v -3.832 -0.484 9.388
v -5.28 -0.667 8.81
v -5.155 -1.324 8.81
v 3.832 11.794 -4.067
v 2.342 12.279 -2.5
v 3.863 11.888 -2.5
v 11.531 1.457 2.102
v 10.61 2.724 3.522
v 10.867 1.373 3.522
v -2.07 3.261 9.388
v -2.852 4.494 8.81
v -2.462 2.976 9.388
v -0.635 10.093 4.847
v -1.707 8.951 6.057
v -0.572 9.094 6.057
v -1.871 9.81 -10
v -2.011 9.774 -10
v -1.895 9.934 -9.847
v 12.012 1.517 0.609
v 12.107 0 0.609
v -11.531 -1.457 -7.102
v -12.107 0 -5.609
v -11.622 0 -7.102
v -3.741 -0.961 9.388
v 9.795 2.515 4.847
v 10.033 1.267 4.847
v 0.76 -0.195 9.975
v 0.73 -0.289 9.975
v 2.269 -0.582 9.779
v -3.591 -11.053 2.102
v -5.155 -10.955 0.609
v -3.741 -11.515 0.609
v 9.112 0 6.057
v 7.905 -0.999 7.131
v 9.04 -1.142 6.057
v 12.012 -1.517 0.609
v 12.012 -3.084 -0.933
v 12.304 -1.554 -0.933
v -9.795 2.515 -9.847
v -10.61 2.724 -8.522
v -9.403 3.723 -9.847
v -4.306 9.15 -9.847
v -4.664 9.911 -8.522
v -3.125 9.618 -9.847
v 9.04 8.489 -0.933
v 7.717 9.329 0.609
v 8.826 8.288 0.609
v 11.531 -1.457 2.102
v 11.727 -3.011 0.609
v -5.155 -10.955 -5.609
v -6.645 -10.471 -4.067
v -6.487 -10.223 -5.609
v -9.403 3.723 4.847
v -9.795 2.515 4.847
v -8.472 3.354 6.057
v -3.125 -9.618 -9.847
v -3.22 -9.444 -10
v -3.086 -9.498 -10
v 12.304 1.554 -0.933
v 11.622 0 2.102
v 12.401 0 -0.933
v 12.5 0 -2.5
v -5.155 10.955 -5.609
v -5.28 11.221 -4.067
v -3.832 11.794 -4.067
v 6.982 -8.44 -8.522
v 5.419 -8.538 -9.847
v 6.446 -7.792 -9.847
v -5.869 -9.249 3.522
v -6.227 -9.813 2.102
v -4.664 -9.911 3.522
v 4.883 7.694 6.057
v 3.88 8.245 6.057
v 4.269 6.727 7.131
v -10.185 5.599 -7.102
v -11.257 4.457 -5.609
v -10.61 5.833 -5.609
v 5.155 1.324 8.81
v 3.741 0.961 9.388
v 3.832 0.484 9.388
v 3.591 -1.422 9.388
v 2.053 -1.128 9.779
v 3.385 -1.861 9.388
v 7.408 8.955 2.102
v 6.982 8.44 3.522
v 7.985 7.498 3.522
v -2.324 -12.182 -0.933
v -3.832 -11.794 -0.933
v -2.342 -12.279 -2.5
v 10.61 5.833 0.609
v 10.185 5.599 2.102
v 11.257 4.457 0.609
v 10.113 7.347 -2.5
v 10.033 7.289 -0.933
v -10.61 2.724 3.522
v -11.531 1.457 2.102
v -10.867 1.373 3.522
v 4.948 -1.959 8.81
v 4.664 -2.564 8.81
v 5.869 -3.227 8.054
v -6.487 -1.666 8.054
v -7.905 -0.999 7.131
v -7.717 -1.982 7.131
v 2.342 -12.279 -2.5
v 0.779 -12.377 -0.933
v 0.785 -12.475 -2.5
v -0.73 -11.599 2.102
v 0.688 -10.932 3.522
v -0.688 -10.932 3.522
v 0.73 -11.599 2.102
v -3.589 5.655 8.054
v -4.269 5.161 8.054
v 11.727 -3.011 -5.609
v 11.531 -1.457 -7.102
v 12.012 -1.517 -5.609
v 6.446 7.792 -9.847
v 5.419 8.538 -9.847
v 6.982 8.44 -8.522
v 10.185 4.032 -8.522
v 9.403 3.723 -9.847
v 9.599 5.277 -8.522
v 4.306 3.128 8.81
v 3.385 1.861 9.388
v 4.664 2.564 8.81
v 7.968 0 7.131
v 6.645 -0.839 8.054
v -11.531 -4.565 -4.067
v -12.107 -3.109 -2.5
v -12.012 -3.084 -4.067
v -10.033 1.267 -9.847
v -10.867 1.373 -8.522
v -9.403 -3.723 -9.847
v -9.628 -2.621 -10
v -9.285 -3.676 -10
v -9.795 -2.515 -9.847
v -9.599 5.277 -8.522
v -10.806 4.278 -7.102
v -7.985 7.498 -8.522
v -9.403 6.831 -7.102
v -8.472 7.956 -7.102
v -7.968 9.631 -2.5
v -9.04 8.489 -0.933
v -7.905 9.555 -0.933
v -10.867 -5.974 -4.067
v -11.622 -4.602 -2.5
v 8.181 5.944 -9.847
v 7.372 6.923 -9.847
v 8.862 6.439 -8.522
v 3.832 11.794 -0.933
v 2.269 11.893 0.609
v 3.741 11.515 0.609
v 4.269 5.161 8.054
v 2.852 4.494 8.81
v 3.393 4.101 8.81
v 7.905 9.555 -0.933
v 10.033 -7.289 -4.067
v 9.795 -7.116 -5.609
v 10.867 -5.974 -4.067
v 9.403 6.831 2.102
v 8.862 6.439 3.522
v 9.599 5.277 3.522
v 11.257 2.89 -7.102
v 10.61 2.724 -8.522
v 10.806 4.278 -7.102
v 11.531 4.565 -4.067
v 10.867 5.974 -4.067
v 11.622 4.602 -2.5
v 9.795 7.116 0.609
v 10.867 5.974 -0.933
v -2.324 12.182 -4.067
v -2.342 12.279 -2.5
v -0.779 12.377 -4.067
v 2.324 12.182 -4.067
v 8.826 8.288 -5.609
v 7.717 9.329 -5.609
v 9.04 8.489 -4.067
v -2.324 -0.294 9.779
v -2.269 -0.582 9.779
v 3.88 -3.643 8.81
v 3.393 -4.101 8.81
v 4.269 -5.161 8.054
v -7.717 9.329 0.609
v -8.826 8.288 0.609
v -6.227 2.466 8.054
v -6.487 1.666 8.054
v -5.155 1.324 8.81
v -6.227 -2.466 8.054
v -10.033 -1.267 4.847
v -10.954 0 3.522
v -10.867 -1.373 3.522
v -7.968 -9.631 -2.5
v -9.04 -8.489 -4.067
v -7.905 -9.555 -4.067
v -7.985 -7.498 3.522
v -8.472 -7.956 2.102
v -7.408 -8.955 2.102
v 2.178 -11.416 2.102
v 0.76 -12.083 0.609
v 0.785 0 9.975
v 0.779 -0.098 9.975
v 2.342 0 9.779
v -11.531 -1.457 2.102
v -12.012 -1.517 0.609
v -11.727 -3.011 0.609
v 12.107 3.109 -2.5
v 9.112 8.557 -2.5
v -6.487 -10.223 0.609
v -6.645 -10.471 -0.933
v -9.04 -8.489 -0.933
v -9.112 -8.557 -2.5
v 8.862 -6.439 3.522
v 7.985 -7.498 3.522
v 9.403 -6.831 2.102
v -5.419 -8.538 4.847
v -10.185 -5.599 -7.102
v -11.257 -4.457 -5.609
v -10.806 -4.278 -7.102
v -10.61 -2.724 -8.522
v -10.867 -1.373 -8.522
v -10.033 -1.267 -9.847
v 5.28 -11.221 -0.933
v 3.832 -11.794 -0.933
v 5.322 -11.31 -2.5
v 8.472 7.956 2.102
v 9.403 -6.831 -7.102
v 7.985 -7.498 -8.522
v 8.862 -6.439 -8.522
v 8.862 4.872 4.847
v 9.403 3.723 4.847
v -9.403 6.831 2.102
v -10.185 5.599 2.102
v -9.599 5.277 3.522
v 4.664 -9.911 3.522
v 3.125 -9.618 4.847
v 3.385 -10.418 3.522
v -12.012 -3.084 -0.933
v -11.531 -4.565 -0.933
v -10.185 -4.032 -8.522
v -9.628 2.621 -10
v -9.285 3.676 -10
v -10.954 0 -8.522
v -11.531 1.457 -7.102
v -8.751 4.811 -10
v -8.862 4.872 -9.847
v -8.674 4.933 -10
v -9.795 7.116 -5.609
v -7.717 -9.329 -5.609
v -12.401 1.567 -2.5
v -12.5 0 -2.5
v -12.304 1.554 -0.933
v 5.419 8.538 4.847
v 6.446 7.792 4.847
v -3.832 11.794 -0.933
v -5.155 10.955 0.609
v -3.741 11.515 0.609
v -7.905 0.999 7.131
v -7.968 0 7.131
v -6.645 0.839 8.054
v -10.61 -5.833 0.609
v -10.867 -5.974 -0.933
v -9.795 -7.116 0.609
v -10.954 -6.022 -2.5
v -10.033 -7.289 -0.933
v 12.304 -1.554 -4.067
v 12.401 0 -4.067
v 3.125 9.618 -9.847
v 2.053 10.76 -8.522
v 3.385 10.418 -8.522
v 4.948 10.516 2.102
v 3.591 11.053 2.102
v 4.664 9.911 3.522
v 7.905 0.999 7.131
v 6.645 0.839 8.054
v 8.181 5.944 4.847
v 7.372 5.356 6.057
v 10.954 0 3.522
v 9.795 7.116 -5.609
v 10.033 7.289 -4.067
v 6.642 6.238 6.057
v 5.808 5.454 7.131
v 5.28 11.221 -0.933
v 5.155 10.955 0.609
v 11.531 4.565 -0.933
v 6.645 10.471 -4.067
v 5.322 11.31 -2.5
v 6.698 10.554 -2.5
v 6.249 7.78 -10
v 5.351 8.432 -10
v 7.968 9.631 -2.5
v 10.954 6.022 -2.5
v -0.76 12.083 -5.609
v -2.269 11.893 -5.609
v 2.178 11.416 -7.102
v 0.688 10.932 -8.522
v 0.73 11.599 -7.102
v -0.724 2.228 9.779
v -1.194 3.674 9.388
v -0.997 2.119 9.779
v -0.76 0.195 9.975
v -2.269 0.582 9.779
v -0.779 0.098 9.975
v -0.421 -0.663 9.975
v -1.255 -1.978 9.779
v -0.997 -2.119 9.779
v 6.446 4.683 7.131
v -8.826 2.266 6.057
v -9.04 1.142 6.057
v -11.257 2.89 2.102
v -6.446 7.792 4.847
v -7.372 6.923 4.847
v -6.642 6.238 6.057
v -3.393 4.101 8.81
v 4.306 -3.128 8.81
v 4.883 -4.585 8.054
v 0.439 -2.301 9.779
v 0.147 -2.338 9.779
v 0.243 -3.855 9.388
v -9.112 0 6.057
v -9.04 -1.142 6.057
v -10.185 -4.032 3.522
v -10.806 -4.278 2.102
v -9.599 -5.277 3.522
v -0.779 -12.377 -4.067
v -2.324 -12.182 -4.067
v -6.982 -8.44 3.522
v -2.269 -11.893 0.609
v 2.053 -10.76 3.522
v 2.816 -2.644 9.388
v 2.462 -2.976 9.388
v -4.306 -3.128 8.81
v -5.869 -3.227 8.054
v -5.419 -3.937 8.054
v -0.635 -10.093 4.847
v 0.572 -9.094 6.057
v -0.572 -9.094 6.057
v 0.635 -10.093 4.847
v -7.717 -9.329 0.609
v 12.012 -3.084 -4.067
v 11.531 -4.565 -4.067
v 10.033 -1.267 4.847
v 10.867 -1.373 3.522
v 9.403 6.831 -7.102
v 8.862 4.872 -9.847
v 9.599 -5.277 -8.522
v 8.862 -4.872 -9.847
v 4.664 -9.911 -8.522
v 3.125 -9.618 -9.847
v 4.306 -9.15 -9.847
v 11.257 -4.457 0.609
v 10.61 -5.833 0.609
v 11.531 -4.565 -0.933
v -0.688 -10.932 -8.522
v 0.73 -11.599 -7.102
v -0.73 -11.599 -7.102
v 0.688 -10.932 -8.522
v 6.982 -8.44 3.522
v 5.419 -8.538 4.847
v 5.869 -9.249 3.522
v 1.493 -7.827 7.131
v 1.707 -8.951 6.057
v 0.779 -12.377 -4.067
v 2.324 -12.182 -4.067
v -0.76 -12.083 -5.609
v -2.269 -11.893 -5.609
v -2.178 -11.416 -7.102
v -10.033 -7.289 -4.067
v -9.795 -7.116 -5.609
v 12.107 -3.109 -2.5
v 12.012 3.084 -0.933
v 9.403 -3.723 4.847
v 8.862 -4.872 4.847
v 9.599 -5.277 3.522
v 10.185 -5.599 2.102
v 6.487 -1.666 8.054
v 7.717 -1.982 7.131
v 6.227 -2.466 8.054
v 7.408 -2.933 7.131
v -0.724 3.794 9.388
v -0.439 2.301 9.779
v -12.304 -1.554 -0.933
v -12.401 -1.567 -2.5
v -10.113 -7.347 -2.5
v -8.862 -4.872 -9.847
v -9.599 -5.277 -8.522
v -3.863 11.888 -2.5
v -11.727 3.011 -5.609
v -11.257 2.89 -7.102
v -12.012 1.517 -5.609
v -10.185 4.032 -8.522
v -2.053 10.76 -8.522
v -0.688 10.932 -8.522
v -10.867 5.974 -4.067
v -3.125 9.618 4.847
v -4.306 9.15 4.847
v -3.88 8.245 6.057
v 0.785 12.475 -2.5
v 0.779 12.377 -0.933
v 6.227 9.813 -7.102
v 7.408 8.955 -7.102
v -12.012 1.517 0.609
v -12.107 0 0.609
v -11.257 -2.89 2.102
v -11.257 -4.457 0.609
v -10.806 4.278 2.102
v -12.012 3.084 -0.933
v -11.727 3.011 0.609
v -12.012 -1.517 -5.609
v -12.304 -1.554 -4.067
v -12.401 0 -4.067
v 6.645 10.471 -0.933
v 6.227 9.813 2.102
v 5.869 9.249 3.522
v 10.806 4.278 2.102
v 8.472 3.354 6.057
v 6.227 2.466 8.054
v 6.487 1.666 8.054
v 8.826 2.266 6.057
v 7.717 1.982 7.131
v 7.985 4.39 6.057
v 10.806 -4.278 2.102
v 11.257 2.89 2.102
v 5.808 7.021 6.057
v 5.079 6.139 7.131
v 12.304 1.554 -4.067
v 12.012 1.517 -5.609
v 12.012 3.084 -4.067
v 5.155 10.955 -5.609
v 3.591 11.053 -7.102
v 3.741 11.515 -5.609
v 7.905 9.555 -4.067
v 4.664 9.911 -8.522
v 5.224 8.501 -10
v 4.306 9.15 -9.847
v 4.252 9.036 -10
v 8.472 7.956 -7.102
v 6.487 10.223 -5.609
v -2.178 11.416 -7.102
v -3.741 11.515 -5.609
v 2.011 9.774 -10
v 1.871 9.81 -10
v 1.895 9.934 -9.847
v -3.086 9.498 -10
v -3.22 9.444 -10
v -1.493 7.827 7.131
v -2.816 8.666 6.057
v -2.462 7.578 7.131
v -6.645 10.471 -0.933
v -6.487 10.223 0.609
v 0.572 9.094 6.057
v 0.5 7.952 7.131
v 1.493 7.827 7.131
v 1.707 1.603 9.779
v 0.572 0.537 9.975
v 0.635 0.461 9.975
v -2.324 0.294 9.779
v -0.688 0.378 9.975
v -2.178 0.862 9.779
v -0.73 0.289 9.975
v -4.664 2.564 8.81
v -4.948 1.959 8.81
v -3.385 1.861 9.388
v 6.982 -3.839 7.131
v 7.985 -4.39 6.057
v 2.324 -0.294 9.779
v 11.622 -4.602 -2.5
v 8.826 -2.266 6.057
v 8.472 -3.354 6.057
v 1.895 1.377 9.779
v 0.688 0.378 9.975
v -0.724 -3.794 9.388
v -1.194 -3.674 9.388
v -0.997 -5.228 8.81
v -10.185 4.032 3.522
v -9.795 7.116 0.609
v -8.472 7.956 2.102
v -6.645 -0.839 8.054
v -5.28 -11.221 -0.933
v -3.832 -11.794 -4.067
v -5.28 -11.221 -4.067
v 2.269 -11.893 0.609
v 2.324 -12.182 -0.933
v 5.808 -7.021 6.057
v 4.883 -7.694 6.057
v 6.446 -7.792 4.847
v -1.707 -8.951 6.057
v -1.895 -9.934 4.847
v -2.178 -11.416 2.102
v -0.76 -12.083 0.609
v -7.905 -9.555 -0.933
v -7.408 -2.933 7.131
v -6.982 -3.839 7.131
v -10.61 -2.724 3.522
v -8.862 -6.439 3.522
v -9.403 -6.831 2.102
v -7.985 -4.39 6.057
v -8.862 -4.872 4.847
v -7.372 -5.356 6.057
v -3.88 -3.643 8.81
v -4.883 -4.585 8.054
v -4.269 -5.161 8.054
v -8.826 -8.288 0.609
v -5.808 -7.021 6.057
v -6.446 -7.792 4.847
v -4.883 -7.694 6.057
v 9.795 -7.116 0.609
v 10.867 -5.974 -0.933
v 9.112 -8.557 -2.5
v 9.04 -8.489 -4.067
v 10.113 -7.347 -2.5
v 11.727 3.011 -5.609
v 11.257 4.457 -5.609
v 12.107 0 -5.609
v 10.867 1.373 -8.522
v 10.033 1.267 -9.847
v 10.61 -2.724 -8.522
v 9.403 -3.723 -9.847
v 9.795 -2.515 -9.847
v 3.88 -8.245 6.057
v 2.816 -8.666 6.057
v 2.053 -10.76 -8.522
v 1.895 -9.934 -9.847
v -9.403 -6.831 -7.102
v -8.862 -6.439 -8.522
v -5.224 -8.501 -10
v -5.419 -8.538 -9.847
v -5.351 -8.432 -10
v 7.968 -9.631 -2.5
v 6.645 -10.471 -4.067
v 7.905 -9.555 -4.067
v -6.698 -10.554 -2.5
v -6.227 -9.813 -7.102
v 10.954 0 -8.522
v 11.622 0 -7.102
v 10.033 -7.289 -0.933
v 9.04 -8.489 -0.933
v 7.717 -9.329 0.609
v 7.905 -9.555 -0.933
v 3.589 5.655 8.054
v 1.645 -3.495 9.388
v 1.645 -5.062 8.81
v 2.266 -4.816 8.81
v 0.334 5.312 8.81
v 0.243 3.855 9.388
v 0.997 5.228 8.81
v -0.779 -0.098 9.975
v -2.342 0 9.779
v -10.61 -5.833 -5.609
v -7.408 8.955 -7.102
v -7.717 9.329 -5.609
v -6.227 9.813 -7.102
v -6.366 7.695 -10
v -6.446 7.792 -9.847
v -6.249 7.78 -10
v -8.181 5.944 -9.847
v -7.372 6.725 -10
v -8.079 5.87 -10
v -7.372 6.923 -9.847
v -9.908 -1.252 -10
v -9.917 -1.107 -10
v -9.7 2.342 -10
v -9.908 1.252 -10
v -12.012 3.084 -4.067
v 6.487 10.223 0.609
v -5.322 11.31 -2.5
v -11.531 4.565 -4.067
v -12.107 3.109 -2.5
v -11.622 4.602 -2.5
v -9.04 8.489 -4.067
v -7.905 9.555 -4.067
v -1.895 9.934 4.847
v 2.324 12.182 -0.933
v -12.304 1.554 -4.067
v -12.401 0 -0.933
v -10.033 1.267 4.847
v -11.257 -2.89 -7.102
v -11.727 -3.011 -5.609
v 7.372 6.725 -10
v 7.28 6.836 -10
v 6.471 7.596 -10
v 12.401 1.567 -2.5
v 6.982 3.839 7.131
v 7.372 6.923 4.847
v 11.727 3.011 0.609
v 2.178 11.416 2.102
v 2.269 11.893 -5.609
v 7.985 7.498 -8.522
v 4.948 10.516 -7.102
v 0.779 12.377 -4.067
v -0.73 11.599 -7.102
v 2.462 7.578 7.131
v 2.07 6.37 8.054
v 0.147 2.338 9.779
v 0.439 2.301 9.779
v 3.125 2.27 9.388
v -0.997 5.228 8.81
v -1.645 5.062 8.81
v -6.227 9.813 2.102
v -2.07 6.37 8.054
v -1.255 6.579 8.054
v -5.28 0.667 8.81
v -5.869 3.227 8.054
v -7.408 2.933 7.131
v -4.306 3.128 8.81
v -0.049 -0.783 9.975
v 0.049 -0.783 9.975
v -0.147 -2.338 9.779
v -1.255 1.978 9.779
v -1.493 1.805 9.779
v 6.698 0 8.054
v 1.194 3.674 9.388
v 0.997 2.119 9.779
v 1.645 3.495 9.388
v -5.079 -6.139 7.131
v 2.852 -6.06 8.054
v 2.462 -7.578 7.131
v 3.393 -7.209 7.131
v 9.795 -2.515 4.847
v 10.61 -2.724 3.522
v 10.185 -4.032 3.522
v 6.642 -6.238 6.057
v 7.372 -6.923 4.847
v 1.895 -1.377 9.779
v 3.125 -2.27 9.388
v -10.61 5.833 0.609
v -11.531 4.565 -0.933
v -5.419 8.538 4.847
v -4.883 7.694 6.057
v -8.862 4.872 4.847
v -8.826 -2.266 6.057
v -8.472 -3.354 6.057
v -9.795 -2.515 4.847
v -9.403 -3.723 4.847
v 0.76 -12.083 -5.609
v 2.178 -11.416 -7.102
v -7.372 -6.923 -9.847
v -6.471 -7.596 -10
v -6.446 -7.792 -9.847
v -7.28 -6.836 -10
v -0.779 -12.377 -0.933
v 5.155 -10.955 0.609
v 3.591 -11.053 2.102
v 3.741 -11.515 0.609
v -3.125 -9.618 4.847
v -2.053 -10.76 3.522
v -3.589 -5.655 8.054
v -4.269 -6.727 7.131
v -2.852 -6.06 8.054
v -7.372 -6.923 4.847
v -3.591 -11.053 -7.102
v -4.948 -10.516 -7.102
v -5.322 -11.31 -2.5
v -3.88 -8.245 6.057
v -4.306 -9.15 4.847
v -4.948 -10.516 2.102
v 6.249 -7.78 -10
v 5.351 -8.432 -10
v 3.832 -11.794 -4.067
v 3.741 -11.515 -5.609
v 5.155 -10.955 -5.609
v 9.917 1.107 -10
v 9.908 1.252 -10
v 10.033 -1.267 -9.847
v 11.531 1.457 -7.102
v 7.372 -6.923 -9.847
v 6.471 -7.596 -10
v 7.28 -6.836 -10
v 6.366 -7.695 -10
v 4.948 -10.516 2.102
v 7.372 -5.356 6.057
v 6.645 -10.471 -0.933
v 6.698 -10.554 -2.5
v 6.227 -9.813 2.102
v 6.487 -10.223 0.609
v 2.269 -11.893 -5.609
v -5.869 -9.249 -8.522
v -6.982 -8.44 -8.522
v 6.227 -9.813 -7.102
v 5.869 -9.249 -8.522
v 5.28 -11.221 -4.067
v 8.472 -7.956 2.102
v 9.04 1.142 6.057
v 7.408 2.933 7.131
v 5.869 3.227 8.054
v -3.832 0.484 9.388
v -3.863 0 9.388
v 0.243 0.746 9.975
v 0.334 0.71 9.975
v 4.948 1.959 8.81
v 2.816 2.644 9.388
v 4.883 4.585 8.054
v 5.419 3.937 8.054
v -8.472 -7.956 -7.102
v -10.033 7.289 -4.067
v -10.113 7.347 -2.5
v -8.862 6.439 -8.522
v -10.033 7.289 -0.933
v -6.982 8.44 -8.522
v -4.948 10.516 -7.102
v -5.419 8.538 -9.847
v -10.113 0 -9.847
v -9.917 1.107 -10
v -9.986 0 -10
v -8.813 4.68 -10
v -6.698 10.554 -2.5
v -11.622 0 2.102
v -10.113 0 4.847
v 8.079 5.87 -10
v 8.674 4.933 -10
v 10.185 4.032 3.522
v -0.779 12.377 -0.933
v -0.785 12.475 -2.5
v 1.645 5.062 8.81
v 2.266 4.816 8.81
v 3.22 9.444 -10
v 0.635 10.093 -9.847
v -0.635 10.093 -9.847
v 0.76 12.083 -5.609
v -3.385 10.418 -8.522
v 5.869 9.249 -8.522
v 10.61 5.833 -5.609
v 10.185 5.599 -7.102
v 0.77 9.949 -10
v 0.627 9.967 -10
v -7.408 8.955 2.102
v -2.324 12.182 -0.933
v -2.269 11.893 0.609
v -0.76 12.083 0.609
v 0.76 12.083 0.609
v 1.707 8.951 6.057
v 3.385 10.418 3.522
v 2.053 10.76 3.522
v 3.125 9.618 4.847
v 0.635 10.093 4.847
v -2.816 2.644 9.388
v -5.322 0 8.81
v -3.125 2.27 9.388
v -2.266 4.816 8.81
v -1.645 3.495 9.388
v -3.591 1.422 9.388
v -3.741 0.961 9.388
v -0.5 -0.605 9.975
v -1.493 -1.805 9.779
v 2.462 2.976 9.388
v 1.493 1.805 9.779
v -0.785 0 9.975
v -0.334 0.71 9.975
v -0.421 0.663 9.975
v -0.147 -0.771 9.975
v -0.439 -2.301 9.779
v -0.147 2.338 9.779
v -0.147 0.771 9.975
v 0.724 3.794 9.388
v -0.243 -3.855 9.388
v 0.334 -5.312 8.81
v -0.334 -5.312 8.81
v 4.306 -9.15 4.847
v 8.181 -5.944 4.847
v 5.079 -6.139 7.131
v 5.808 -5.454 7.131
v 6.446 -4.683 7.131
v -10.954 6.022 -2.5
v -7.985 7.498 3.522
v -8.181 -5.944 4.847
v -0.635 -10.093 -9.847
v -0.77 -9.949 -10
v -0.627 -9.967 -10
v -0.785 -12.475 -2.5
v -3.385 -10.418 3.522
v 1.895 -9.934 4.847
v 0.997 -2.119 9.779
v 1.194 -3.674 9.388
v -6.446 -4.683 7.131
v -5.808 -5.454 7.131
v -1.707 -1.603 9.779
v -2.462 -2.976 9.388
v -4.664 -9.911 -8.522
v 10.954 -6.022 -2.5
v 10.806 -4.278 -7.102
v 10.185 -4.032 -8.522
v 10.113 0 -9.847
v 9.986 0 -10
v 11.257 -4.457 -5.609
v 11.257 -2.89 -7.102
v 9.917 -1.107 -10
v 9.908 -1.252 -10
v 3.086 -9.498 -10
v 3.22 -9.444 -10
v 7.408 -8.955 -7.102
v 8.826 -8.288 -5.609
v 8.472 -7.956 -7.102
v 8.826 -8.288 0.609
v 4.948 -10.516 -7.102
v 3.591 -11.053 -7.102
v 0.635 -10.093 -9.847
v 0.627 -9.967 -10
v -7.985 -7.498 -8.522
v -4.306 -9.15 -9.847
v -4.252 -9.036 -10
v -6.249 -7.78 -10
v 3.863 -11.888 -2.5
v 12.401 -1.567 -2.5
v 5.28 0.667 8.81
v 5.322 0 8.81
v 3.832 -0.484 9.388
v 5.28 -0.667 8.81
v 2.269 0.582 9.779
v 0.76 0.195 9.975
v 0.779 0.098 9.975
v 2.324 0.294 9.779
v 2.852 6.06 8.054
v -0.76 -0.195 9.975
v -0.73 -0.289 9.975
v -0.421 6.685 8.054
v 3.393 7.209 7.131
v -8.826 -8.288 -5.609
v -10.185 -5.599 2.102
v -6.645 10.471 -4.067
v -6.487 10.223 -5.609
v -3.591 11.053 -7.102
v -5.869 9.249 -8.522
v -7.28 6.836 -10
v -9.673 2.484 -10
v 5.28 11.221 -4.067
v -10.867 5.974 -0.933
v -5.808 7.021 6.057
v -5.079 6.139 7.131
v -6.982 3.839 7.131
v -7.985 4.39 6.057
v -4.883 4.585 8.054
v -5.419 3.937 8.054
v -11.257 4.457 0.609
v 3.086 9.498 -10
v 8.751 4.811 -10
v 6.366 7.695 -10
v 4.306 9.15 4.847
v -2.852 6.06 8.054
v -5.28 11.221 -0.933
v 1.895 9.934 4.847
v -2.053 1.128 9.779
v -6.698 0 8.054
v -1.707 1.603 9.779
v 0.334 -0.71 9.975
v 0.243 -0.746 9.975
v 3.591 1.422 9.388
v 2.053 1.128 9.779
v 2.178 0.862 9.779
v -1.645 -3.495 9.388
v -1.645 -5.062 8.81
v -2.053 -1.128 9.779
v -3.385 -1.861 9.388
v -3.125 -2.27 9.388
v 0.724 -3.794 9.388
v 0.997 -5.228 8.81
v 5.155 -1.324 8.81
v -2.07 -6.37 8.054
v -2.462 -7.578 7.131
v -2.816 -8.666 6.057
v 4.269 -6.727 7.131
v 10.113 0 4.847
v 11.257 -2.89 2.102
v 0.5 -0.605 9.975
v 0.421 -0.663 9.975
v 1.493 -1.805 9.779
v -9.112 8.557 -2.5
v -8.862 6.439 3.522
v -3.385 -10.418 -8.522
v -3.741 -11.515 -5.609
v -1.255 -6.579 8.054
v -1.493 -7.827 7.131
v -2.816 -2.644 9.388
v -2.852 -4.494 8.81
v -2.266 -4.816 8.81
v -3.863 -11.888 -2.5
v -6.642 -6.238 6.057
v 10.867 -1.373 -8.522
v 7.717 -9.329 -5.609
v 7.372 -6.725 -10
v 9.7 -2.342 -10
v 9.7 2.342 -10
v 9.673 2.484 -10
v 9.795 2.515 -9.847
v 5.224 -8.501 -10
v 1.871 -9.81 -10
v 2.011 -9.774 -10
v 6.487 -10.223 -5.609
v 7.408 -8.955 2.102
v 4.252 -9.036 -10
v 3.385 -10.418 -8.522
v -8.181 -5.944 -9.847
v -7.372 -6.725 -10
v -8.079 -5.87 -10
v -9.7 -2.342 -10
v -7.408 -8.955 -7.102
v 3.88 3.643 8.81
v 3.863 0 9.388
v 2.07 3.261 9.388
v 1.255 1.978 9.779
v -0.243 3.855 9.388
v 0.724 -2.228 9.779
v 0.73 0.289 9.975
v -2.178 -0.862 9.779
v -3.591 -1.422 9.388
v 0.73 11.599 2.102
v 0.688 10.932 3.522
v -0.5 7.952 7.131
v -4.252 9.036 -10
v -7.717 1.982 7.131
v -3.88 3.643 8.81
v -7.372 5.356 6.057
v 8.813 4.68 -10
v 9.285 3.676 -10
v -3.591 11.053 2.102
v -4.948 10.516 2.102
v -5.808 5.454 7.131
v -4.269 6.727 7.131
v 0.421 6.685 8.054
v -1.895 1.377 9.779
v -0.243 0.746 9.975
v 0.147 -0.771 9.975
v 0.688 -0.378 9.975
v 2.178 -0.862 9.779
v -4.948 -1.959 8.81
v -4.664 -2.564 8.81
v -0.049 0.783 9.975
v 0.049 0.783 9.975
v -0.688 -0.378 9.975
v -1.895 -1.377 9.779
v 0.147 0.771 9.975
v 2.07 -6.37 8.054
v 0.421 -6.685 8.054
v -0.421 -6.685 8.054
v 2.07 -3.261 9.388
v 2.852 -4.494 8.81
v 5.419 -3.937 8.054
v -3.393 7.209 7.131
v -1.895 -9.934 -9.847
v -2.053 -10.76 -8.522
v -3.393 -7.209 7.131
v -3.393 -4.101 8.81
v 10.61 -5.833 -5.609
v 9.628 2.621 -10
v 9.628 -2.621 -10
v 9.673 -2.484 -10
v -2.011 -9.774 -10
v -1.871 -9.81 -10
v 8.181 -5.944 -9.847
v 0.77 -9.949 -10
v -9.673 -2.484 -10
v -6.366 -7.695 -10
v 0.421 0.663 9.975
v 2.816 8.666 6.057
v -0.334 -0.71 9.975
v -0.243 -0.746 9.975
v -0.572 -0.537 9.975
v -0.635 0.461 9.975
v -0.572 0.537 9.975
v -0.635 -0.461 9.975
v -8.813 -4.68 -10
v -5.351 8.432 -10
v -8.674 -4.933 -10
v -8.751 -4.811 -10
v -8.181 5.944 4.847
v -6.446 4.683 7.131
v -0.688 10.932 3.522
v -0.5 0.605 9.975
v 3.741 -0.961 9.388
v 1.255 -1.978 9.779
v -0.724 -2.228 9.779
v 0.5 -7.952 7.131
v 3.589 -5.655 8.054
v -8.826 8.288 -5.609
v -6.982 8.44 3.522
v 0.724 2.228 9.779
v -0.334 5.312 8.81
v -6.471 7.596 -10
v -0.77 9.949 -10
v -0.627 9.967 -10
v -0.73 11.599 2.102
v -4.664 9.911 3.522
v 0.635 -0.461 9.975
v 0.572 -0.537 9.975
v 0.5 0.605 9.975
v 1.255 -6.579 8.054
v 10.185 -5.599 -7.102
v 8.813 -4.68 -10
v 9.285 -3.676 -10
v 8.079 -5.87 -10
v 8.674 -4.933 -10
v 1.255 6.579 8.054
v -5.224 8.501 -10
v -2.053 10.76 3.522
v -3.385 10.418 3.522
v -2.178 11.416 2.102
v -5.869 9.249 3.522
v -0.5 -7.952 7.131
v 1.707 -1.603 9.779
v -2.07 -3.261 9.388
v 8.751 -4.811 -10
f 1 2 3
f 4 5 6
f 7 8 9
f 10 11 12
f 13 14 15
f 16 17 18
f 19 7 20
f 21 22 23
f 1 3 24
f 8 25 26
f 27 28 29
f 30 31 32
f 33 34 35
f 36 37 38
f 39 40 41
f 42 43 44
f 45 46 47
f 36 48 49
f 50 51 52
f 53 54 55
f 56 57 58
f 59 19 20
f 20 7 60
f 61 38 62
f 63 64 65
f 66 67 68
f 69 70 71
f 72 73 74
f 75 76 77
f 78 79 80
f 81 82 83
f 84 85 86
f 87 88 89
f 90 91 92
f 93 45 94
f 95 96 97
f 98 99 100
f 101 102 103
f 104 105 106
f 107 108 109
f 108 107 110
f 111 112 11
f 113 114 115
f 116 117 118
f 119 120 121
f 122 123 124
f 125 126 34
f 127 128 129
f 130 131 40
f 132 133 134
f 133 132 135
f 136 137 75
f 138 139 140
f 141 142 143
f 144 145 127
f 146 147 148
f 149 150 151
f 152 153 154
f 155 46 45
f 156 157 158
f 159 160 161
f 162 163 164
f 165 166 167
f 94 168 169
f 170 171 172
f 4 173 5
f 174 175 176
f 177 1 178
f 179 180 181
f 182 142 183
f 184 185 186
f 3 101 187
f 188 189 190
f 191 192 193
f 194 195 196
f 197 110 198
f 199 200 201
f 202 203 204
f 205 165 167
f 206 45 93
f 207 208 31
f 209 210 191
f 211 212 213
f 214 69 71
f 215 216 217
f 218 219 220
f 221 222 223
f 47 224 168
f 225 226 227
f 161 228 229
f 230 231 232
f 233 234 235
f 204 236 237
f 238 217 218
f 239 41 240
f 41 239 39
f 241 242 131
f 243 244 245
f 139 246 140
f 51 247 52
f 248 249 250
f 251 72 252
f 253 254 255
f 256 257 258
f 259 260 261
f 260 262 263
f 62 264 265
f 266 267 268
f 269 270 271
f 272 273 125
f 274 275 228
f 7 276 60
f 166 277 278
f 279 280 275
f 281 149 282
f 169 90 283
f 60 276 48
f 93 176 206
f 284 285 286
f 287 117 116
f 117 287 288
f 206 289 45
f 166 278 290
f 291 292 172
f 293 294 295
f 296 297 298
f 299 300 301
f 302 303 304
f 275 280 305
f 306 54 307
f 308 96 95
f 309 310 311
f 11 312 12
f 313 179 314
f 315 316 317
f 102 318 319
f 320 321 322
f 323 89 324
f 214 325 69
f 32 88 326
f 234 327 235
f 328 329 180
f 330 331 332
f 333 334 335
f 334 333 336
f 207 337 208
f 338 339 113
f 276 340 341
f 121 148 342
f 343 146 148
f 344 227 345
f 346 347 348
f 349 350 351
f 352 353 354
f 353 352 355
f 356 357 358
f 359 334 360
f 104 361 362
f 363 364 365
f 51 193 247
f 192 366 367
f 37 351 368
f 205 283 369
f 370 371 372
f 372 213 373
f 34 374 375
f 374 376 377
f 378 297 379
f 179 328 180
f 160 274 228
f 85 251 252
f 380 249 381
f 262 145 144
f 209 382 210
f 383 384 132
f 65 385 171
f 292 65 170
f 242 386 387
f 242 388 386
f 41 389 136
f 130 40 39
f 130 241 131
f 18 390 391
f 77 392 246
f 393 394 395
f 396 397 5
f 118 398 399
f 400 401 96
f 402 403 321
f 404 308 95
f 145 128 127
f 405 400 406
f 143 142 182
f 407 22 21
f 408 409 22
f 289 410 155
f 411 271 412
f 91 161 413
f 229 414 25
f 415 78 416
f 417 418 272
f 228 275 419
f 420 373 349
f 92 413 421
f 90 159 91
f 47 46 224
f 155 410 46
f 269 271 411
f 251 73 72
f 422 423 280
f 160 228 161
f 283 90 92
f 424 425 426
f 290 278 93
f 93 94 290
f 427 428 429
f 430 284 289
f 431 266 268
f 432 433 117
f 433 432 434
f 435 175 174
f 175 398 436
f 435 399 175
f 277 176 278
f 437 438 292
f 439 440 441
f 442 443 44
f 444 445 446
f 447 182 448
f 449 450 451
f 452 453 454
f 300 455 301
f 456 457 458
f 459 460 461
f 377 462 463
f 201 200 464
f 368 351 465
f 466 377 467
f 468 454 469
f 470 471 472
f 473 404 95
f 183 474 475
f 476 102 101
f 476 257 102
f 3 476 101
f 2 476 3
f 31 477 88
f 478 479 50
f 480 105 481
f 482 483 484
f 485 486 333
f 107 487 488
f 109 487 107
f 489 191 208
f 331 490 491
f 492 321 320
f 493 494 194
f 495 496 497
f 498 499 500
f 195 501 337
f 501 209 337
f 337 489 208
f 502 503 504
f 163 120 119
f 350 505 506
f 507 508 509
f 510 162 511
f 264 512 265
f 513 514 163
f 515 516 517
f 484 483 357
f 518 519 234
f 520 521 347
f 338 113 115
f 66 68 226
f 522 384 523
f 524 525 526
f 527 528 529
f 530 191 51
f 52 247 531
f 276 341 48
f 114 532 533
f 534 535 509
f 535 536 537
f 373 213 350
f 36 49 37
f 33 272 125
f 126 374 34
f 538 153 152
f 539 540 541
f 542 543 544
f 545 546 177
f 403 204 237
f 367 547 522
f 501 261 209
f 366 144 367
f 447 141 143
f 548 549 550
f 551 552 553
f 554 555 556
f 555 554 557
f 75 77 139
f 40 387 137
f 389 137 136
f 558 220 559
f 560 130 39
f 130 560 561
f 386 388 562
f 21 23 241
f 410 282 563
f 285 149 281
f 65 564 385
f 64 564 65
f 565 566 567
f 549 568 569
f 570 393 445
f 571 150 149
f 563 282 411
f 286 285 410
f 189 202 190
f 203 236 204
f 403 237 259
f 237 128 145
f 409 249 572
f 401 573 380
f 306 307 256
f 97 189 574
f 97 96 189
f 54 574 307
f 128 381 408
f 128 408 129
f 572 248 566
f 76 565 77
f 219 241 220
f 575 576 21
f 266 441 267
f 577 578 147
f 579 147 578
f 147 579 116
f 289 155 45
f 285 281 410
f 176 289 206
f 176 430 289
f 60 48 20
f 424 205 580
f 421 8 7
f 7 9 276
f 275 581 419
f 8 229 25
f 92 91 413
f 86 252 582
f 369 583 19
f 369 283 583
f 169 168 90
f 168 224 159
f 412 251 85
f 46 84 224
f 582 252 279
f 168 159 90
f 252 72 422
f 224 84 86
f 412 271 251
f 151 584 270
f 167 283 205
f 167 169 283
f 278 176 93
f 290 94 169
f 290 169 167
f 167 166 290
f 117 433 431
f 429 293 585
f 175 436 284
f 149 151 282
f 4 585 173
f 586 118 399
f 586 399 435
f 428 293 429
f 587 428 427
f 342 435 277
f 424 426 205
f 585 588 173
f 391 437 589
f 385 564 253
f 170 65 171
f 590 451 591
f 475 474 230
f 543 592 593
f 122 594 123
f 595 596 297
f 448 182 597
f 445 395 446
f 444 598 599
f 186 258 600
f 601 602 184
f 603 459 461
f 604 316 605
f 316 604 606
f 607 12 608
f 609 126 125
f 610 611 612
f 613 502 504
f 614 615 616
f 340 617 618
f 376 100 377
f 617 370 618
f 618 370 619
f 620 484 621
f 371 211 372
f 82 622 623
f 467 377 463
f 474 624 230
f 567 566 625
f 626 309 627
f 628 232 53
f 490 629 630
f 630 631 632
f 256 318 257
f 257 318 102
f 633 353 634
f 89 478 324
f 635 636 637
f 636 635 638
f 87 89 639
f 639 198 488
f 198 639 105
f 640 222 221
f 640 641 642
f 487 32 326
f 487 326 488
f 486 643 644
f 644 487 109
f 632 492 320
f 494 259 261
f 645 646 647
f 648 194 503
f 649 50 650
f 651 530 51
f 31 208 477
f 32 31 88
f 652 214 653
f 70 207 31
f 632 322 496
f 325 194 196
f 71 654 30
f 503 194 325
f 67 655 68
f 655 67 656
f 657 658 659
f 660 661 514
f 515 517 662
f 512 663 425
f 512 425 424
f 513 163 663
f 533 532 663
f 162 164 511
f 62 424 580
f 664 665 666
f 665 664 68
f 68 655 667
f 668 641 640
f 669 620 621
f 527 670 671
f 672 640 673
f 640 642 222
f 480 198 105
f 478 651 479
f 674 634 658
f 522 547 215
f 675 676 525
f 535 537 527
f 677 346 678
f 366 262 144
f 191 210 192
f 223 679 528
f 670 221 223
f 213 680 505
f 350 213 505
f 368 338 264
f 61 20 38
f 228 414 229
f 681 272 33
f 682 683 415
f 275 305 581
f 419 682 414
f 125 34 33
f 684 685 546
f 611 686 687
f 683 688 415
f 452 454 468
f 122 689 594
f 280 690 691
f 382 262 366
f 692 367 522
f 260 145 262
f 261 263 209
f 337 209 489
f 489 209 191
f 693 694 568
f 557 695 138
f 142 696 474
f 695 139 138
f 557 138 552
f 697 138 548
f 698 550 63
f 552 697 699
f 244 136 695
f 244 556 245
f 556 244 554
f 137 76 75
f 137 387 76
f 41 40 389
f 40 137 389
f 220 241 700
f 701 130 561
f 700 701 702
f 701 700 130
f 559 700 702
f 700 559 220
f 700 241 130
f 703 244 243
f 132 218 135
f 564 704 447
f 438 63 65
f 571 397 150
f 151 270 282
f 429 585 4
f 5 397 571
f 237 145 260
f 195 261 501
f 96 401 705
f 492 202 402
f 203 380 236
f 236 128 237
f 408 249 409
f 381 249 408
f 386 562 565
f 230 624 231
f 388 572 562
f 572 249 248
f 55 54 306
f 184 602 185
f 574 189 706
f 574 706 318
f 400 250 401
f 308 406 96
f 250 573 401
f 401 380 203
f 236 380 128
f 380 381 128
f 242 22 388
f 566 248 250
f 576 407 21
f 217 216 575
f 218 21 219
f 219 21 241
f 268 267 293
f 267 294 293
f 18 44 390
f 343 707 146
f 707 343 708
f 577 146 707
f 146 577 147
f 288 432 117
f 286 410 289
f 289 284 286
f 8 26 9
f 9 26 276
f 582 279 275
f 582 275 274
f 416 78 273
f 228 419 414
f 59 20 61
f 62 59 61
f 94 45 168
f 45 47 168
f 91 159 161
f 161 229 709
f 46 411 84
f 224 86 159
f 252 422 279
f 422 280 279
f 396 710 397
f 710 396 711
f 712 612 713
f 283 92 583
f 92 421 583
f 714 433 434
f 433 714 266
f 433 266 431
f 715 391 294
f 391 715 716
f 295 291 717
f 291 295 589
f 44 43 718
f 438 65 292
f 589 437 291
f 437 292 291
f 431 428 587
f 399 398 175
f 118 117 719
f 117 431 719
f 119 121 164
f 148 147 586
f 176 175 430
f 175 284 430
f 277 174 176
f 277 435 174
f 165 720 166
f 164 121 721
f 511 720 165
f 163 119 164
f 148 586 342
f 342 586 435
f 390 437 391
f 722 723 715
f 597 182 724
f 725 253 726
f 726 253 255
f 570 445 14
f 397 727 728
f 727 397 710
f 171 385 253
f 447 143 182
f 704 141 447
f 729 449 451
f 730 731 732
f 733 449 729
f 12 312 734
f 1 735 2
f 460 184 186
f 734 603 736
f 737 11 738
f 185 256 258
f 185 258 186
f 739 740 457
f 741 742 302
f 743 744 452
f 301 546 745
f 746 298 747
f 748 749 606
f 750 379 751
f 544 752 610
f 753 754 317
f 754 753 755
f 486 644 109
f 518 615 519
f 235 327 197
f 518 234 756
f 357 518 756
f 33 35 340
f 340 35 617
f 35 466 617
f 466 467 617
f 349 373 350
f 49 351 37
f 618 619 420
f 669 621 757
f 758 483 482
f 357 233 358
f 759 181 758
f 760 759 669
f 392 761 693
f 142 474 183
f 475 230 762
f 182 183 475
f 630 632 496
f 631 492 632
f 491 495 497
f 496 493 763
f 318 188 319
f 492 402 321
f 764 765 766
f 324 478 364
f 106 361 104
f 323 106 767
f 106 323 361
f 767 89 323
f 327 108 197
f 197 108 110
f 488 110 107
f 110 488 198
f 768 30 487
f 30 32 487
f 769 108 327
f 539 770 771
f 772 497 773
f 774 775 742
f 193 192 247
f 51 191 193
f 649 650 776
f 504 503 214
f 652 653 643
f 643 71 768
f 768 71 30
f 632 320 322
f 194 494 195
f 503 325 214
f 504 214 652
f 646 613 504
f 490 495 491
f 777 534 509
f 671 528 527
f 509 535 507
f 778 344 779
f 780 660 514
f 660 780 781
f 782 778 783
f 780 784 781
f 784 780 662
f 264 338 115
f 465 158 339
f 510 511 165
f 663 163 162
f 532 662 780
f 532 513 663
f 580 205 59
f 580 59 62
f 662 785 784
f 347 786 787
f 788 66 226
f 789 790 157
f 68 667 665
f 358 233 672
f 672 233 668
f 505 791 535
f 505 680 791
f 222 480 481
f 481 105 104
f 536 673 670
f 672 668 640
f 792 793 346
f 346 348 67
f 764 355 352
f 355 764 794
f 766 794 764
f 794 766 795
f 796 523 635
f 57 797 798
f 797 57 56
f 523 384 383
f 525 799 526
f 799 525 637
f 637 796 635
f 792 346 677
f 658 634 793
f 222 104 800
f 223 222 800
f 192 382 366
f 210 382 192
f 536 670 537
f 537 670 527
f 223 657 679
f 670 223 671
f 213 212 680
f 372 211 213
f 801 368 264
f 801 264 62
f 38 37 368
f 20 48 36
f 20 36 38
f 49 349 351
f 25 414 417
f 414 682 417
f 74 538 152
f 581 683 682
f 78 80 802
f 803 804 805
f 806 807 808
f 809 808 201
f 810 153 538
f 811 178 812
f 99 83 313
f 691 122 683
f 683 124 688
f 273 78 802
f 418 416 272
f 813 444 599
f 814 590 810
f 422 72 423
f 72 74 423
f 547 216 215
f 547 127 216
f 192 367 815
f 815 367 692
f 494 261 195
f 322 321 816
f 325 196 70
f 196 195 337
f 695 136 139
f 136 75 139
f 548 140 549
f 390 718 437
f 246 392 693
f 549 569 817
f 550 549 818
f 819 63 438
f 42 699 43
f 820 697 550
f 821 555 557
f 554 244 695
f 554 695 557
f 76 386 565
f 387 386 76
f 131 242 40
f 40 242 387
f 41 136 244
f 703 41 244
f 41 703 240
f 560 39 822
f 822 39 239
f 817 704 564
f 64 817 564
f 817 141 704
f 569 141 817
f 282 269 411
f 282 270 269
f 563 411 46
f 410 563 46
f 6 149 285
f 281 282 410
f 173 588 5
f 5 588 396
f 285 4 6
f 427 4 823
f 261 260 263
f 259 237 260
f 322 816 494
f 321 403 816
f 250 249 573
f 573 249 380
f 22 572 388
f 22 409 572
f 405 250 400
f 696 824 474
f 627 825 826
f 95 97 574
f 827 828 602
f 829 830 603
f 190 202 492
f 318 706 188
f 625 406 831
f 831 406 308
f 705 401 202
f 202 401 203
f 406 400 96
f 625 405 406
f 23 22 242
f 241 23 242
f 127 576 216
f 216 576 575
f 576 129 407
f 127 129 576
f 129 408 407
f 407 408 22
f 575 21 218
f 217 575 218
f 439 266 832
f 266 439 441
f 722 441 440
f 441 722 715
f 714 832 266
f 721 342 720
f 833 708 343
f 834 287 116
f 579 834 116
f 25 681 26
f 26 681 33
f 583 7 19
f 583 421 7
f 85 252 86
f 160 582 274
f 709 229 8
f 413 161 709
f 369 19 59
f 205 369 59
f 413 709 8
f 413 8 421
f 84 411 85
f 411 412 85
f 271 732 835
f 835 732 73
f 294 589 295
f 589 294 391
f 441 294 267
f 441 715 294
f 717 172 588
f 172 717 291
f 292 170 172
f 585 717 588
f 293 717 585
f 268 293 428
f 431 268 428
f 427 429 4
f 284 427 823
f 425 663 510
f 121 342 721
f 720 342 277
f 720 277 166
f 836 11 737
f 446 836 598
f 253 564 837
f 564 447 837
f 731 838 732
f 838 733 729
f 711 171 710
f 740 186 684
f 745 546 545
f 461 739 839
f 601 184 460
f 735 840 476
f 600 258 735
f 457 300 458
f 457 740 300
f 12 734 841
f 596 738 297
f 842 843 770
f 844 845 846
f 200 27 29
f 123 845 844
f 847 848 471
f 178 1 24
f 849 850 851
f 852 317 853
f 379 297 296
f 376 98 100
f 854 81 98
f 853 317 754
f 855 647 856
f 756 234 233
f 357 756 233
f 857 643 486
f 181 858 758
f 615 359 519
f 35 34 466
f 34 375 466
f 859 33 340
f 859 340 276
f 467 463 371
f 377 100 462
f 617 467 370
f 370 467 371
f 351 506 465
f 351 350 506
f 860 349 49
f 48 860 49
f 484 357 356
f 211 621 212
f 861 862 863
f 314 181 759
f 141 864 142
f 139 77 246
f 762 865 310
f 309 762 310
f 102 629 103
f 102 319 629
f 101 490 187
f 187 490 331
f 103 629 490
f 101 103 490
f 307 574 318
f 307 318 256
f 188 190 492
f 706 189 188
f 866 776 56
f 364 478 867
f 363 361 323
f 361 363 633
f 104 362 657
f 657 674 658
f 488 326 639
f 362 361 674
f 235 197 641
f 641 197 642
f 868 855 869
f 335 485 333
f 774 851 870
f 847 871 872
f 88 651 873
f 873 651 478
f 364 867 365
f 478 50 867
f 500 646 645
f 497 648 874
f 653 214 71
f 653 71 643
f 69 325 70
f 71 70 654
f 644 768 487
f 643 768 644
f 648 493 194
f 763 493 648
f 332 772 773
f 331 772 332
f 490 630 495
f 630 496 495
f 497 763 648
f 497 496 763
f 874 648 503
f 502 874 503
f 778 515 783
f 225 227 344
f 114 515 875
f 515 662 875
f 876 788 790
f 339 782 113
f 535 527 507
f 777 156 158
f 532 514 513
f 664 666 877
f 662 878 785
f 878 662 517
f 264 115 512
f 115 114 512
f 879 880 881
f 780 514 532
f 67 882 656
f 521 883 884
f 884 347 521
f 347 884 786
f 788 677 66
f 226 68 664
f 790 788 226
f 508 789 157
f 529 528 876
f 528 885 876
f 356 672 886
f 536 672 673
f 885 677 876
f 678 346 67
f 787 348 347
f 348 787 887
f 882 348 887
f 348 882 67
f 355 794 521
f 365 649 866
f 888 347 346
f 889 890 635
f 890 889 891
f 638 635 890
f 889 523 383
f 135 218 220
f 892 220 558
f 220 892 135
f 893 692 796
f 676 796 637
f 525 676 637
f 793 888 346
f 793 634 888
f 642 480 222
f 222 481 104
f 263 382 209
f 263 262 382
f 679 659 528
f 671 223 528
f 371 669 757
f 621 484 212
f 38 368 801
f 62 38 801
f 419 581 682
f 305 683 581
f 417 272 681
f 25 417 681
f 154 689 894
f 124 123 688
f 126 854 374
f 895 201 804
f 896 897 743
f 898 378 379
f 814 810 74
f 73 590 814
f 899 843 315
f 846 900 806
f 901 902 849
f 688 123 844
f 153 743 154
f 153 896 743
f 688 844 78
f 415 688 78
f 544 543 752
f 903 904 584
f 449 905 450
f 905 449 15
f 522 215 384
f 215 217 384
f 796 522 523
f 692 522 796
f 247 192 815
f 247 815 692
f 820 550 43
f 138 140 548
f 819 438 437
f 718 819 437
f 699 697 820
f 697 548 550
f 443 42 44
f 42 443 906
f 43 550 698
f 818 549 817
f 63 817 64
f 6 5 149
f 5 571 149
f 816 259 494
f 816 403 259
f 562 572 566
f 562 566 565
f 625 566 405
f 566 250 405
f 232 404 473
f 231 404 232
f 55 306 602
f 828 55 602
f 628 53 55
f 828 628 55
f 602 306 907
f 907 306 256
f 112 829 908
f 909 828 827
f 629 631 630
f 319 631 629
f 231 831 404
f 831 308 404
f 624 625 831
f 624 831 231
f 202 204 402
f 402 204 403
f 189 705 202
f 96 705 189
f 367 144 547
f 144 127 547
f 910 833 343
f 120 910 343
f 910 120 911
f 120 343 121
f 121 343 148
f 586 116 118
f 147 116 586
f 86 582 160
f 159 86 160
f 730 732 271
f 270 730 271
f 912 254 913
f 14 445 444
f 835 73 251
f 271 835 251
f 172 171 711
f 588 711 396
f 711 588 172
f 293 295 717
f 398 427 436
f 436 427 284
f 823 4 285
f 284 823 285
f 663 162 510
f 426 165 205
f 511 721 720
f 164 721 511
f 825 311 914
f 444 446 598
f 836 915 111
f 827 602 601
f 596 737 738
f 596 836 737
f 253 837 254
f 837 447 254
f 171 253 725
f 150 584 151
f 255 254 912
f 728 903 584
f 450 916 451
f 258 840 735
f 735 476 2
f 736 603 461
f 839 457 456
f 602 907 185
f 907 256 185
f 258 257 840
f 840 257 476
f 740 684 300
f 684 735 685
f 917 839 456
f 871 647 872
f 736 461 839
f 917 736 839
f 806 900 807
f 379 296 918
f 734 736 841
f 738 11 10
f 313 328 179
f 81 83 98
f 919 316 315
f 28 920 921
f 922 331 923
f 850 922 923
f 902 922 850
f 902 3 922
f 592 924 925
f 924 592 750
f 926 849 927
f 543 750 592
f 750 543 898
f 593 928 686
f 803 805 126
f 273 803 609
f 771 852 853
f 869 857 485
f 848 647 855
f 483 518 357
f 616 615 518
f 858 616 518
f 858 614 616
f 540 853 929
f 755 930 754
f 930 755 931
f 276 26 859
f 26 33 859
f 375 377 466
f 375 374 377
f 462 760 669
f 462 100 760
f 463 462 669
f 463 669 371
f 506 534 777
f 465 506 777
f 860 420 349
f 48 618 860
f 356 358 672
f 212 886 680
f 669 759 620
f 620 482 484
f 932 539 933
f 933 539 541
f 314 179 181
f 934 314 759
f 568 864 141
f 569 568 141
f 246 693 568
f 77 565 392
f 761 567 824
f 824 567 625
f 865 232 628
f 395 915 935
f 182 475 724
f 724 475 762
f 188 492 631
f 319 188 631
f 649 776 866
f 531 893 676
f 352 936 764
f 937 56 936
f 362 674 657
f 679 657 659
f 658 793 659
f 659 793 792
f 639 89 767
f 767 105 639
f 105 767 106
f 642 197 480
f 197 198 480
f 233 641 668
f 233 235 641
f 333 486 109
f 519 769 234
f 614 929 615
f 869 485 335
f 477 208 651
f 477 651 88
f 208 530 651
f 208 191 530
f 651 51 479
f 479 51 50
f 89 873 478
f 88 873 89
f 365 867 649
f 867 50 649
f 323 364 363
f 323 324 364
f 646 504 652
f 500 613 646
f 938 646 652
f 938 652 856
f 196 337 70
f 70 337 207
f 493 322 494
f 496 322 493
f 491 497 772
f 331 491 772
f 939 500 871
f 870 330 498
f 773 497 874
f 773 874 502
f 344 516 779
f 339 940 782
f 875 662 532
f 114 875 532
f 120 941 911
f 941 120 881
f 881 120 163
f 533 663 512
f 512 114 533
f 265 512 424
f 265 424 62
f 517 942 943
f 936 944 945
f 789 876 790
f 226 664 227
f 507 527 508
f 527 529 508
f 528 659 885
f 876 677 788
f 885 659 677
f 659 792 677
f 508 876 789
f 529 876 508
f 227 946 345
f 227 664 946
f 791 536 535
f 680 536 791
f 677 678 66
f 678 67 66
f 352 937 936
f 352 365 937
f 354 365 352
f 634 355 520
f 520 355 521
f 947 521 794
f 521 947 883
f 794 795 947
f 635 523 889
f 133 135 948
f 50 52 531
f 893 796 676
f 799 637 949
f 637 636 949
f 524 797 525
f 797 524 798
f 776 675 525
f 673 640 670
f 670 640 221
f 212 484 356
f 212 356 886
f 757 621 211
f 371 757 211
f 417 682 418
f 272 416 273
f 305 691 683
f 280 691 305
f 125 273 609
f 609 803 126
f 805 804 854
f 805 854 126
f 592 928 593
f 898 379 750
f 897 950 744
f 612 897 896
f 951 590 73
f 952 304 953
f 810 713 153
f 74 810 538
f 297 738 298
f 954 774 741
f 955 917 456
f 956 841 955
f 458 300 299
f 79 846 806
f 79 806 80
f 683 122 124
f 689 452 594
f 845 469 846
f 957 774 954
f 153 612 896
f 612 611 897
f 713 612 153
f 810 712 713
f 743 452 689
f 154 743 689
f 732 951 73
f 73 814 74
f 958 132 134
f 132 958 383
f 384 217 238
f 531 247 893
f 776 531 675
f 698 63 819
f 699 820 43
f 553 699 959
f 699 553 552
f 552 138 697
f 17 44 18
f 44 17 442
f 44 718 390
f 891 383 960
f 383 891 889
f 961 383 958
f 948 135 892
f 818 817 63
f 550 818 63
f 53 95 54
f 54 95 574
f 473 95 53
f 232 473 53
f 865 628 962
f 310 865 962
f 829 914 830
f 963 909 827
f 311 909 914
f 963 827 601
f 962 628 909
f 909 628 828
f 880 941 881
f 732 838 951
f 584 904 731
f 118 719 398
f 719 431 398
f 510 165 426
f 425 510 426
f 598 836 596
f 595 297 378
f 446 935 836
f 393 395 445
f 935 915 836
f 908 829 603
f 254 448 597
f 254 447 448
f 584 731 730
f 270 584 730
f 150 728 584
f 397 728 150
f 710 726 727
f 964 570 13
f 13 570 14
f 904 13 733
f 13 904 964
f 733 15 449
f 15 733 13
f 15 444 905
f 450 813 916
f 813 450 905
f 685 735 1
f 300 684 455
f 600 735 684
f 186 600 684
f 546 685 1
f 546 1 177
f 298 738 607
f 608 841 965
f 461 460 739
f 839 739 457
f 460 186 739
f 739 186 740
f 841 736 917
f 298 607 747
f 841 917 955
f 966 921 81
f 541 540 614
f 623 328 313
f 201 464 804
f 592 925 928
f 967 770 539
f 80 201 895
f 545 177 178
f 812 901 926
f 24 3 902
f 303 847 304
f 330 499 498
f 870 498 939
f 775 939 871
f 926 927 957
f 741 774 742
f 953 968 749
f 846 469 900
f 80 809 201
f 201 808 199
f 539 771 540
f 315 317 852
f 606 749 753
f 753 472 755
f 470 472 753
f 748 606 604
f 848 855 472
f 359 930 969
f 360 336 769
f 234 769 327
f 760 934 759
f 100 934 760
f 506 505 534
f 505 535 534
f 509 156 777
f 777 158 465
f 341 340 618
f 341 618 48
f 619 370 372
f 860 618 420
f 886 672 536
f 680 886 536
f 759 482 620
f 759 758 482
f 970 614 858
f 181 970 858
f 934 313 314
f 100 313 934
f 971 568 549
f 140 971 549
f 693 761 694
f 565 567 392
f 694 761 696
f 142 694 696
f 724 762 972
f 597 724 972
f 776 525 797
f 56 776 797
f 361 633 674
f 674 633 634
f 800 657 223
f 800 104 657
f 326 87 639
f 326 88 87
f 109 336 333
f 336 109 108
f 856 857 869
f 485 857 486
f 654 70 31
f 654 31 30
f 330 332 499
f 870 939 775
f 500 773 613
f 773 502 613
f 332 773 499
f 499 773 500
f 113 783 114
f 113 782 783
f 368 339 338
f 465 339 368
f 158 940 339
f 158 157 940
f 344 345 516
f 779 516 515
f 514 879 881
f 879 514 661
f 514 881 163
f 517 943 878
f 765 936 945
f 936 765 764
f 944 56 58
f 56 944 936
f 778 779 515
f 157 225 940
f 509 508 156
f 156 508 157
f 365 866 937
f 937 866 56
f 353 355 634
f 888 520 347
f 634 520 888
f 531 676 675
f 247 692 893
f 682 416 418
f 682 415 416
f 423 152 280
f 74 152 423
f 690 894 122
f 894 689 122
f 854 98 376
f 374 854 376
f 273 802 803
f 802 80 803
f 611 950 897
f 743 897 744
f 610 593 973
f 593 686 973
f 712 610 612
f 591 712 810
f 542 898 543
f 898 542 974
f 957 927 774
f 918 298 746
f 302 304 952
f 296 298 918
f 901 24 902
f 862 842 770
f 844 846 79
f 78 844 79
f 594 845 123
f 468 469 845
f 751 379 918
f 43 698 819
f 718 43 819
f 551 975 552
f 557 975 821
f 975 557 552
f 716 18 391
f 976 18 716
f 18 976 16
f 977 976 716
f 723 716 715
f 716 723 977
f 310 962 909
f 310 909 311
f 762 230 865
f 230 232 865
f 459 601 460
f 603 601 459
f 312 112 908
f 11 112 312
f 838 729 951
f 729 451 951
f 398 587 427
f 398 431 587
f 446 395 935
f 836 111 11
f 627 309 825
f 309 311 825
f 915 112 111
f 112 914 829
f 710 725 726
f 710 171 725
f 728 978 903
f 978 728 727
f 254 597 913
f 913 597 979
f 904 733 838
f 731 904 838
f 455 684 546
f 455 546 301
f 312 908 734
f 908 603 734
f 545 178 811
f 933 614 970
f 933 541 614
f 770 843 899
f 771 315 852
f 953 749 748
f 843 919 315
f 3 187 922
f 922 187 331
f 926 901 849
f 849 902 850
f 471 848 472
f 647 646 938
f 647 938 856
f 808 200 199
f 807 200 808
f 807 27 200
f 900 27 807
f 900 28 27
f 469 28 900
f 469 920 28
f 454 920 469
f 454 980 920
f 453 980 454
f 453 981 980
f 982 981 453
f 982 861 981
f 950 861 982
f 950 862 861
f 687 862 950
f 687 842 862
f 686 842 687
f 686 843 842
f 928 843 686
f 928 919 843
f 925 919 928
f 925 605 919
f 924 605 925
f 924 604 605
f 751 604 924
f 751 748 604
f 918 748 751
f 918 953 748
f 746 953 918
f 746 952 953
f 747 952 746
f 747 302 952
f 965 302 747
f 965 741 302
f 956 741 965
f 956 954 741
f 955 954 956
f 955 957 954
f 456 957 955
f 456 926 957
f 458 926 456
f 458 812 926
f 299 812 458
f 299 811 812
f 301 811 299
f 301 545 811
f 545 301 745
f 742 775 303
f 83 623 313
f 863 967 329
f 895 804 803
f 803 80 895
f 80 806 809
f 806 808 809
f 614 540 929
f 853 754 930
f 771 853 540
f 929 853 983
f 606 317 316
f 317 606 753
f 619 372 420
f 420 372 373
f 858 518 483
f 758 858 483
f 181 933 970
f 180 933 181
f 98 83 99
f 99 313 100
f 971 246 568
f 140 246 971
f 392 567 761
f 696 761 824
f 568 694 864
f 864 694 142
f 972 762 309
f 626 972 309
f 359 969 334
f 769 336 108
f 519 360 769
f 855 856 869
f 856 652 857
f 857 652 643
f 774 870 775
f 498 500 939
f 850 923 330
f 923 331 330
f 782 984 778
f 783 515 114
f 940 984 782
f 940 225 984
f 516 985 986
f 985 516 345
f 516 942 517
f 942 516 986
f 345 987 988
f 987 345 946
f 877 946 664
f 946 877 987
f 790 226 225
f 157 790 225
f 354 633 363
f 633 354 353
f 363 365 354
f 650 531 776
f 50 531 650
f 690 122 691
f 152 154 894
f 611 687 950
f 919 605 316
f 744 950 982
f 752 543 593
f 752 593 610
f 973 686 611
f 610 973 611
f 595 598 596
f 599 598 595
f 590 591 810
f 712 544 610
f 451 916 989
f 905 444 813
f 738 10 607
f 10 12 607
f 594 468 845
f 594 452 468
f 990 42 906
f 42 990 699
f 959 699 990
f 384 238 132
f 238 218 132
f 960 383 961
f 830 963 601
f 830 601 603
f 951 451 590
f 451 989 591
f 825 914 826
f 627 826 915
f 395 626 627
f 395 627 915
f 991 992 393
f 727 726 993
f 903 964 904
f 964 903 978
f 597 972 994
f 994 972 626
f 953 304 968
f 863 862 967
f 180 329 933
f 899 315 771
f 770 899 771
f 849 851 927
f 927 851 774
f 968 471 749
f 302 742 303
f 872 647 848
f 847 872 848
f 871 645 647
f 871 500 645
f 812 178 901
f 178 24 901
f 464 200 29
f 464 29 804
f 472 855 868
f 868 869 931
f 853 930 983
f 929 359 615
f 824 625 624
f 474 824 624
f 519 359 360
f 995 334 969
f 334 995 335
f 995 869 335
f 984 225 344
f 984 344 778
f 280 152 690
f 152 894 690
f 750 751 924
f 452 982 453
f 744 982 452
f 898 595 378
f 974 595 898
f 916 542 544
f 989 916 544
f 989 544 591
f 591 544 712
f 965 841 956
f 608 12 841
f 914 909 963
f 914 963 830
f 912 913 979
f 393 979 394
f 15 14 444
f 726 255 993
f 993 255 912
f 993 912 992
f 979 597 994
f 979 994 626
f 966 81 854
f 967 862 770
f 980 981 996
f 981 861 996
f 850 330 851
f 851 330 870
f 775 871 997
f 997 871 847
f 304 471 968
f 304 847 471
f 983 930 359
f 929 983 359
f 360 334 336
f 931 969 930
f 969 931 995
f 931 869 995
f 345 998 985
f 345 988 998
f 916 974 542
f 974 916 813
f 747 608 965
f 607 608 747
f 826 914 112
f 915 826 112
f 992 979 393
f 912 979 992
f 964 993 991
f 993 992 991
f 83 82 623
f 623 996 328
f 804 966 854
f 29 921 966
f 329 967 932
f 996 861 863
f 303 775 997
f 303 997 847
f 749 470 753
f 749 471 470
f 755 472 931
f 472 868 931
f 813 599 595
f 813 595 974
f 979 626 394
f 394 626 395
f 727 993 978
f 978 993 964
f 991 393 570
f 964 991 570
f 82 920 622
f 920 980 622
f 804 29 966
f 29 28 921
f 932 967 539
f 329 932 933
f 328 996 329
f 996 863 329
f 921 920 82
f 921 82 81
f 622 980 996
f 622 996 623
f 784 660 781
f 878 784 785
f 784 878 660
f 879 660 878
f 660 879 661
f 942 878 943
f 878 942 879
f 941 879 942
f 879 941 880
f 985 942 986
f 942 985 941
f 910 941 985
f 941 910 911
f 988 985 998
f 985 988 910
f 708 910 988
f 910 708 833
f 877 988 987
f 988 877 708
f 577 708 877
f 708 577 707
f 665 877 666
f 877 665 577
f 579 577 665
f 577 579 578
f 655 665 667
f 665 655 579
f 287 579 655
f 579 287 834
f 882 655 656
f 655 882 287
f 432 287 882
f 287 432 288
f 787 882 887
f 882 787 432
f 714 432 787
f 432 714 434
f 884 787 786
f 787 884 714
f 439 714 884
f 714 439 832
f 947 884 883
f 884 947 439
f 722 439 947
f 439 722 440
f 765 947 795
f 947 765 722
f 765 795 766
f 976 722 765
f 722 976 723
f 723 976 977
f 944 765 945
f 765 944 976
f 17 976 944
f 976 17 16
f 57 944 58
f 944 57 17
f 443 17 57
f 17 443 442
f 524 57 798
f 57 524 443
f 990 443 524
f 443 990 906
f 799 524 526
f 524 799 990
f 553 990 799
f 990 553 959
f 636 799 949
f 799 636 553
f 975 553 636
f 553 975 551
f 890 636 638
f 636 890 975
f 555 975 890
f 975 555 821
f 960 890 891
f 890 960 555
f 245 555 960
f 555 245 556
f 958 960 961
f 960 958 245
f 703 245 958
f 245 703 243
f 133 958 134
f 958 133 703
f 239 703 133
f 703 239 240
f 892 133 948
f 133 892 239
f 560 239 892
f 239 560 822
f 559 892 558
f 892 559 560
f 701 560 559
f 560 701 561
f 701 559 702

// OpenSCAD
//============================================================
// OpenSCAD Project : Build a Dome
//
// Vincent DUBOIS
//============================================================

// The Dome is centered at origine. Do what you want after build
// D = Ground Diameter (Basement)
// H = Height of the Dome (from center)

// Explain :
// There is only one Sphere for 3 points in space.
// H + Diameter (2 points on the Diameter) = 3
// Whatever are H and R with 0<R and 0<H
// The Sphere Radius is an equation of R and H
// See below

// use as : use <dome.scad>
// inside script : Dome(D=Diameter,H=height)

//------------------------------------------------------------
// Parameters for Customizer
// Tested with OpenSCAD version 2017.01.20 (git 59df0d1)
//------------------------------------------------------------
/* [OpenScad resolution] */
// Set global resolution.
$fn = 50 ; // [1:250]

/* [Dome size] */
// The Height of the dome ]0,∞[.
DomeHeight = 20;

// The diameter of the base of dome [0,∞[ (0=sphere).
BaseDiameter = 20;

/* [Debug mode] */
// Set it if you want the values to be shown in console.
Debug = false;

//------------------------------------------------------------
// View
//------------------------------------------------------------
Dome(BaseDiameter,DomeHeight);


//------------------------------------------------------------
// Build the Dome
// D : Diameter of the Dome - the basement
// H : Height of the Dome
//------------------------------------------------------------
module Dome(D=1,H=2)
{
    // Control to avoid problems
    // a =   test ? TrueValue : FalseValue ;
    D = D<=0 ? abs(D) : D;
    H = H<0 ? abs(H) : H==0 ? 1 : H;

	// Calculation of the sphere radius
	//  ( (H*H) + (R*R) ) / (2*H)
	R=D/2;
	Sphere_Radius = ( pow(H,2) + pow(R,2) ) / (2*H);

	// Log the values, uncomment if needed
    if (Debug)
    {
        echo(str("Debug mode"));
        echo (str("",
            "\nDome Height : ", H,
            "\nBasement Diameter : ", D,
            "\nSphere Radius : ", Sphere_Radius, " (calculated)",
            "\nSphere Diameter : ", Sphere_Radius*2, " (calculated)\n"));
    }
	
	// center at origin the Dome for good rotating
	translate([0,0,-(Sphere_Radius-H)-H/2])

	difference()
	{
		// build the sphere which contain the Dome
		sphere(Sphere_Radius);
		// remove the useless sphere portion with a cube
		translate([0,0,-H])
			cube([2*Sphere_Radius,2*Sphere_Radius,2*Sphere_Radius],center=true);
	}
}

//==EOF=======================================================
